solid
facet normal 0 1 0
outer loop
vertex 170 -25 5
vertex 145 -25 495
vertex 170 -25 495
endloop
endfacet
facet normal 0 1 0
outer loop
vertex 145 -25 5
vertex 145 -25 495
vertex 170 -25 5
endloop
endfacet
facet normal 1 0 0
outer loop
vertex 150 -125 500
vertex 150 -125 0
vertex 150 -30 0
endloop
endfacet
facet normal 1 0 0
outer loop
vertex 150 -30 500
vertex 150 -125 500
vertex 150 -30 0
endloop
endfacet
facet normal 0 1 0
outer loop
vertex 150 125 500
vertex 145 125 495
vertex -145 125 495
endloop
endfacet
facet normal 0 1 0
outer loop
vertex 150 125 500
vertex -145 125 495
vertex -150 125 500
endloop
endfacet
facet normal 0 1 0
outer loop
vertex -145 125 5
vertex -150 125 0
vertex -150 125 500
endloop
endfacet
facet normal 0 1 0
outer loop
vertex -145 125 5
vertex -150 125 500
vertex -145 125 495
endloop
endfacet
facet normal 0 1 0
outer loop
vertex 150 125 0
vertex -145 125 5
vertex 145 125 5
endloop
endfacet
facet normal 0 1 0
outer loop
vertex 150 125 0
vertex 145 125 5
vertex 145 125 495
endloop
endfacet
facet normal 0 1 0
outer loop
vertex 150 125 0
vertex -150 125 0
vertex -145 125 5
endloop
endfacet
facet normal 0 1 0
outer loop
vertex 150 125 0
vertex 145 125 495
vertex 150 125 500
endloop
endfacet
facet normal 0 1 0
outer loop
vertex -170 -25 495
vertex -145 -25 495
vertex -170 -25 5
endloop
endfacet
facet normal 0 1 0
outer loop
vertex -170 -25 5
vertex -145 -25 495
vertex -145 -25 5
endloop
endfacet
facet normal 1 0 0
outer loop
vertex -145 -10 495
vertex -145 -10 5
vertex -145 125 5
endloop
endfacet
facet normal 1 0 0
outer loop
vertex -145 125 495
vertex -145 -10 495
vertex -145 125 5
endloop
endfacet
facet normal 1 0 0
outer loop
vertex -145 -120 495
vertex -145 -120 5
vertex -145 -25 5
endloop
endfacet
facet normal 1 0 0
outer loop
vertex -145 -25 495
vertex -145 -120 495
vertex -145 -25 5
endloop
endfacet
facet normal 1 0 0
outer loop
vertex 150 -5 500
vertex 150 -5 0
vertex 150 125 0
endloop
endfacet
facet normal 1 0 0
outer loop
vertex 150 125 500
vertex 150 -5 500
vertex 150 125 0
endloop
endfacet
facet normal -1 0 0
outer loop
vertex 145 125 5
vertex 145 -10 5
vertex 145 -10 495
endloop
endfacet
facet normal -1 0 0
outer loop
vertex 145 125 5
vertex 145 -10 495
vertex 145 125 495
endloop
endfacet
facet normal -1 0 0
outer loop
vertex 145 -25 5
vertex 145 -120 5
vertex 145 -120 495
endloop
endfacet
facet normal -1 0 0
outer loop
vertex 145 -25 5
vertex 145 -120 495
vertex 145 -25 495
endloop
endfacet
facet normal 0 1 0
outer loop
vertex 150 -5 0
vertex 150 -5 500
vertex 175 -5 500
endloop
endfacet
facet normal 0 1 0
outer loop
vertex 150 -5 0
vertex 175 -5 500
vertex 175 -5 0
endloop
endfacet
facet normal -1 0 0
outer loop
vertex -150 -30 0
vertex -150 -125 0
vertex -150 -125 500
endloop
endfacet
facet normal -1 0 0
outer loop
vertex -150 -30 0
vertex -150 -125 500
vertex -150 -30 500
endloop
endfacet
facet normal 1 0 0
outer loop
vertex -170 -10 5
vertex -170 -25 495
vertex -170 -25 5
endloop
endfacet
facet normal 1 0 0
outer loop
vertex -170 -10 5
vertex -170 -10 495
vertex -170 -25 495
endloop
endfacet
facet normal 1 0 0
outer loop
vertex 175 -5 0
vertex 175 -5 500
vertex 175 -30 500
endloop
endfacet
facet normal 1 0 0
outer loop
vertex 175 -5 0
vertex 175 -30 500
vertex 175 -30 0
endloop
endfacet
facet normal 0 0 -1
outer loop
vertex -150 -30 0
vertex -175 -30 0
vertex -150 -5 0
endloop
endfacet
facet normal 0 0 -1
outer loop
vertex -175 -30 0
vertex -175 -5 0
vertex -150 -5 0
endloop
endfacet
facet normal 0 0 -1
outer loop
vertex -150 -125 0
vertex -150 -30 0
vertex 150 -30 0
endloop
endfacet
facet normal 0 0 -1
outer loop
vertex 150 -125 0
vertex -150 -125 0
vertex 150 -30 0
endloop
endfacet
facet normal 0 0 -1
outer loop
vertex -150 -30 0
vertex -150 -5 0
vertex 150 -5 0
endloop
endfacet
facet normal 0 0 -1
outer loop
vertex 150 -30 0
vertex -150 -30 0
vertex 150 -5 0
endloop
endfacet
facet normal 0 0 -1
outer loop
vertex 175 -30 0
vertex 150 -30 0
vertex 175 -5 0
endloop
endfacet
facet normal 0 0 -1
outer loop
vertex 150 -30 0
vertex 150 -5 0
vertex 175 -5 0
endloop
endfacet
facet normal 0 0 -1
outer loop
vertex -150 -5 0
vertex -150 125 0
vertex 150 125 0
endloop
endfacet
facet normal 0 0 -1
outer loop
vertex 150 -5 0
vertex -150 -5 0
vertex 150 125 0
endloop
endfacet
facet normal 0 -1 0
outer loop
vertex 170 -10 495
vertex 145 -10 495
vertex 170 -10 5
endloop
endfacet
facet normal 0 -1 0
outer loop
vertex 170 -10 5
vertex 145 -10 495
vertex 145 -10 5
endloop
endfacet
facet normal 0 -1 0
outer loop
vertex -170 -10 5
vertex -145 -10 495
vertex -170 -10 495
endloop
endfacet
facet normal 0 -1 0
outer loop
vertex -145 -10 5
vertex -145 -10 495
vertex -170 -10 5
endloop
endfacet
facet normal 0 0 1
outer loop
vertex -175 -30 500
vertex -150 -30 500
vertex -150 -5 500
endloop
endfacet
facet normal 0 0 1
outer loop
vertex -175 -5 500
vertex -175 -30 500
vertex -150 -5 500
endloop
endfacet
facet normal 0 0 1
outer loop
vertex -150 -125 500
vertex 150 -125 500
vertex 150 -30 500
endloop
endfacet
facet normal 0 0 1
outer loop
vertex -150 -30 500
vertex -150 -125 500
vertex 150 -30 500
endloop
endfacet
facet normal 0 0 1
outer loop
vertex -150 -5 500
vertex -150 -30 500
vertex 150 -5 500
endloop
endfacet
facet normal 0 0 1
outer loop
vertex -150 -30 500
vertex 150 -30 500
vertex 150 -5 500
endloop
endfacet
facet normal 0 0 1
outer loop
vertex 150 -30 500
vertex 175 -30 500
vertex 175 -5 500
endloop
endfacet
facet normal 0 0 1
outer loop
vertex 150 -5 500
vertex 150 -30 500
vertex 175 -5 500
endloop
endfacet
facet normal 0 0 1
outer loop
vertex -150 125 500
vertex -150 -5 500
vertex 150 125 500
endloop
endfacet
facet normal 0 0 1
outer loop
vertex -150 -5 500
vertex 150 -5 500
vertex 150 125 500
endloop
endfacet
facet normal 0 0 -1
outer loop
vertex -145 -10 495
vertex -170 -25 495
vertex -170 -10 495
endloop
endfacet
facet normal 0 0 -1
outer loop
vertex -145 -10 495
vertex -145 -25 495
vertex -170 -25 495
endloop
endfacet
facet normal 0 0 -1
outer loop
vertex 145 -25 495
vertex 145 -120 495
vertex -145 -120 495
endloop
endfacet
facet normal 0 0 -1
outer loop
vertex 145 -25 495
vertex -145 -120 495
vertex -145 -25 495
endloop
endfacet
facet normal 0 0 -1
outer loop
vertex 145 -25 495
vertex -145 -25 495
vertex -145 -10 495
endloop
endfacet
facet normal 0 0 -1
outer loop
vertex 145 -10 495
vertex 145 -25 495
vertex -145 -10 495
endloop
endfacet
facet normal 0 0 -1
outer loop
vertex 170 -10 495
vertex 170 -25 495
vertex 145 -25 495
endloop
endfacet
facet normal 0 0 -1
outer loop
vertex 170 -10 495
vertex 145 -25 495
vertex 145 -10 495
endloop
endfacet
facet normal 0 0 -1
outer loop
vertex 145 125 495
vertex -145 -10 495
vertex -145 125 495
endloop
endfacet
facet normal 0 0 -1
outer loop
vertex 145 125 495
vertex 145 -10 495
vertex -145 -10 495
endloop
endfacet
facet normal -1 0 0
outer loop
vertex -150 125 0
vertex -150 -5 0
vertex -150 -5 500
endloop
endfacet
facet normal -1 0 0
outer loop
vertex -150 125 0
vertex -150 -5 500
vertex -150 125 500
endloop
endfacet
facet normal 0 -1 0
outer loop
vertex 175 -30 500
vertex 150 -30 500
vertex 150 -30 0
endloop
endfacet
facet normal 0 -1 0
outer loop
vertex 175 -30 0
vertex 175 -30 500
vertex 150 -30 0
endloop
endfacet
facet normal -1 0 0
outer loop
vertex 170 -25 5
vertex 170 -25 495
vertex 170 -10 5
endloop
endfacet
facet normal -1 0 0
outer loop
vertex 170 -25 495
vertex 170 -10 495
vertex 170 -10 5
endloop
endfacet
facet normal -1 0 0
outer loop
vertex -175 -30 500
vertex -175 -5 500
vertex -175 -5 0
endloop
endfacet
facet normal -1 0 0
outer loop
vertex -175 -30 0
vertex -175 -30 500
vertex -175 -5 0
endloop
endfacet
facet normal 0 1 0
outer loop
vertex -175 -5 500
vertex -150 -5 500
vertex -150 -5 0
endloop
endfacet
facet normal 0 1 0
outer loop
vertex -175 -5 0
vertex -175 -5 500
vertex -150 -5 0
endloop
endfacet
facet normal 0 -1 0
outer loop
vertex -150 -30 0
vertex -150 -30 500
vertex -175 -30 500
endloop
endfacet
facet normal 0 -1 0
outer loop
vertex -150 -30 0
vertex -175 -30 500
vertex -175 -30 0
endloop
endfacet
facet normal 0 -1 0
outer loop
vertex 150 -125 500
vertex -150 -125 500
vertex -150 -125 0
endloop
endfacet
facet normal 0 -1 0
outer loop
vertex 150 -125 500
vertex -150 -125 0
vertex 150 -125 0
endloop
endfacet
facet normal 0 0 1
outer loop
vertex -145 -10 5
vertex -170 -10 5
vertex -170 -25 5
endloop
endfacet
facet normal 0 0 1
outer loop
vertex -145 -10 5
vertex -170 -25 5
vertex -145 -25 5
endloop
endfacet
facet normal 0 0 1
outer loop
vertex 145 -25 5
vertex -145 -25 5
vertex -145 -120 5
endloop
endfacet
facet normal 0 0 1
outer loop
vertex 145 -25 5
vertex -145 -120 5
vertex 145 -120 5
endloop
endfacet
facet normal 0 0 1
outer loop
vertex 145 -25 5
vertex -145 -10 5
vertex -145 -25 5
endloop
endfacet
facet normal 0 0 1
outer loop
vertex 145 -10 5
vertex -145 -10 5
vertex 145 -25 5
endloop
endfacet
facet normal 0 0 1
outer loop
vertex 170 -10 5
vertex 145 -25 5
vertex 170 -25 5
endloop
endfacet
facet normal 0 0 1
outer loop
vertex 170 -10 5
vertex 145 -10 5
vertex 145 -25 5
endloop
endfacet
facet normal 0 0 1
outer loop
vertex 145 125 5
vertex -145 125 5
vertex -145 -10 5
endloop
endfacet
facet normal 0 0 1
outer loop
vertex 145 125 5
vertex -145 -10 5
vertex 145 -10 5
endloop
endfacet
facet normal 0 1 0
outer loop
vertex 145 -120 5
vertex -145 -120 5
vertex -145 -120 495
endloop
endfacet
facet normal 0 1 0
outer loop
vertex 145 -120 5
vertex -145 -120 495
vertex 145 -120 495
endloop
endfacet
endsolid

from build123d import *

# Parameters (mm, degrees)
CROQUIS1_W                   = 300
CROQUIS1_H                   = 250
SALIENTE_EXTRUIR1_DEPTH      = 500
CROQUIS3_W                   = 500
CROQUIS3_H                   = 25
SALIENTE_EXTRUIR2_DEPTH      = 25
SALIENTE_EXTRUIR2_DEPTH_BACK = 325
VACIADO1_T                   = -5


with BuildPart() as part:
    # Croquis1 → Saliente-Extruir1 (new body)
    with BuildSketch(Plane.XY):
        Rectangle(CROQUIS1_W, CROQUIS1_H)
    extrude(amount=SALIENTE_EXTRUIR1_DEPTH)

    # Croquis3 → Saliente-Extruir2 (add, two sides)
    with BuildSketch(Plane(origin=(150, 0, 0), x_dir=(0, 0, -1), z_dir=(1, 0, 0))) as saliente_extruir2_sk:
        with Locations((-250, -17.5)):
            Rectangle(CROQUIS3_W, CROQUIS3_H)
    extrude(amount=SALIENTE_EXTRUIR2_DEPTH)
    extrude(saliente_extruir2_sk.sketch, amount=-SALIENTE_EXTRUIR2_DEPTH_BACK)

    # Vaciado1
    vaciado1_openings = [part.faces().sort_by_distance(p)[0] for p in [
        (0, 125, 250),
    ]]
    offset(amount=VACIADO1_T, openings=vaciado1_openings, kind=Kind.INTERSECTION)


solid = part.part
